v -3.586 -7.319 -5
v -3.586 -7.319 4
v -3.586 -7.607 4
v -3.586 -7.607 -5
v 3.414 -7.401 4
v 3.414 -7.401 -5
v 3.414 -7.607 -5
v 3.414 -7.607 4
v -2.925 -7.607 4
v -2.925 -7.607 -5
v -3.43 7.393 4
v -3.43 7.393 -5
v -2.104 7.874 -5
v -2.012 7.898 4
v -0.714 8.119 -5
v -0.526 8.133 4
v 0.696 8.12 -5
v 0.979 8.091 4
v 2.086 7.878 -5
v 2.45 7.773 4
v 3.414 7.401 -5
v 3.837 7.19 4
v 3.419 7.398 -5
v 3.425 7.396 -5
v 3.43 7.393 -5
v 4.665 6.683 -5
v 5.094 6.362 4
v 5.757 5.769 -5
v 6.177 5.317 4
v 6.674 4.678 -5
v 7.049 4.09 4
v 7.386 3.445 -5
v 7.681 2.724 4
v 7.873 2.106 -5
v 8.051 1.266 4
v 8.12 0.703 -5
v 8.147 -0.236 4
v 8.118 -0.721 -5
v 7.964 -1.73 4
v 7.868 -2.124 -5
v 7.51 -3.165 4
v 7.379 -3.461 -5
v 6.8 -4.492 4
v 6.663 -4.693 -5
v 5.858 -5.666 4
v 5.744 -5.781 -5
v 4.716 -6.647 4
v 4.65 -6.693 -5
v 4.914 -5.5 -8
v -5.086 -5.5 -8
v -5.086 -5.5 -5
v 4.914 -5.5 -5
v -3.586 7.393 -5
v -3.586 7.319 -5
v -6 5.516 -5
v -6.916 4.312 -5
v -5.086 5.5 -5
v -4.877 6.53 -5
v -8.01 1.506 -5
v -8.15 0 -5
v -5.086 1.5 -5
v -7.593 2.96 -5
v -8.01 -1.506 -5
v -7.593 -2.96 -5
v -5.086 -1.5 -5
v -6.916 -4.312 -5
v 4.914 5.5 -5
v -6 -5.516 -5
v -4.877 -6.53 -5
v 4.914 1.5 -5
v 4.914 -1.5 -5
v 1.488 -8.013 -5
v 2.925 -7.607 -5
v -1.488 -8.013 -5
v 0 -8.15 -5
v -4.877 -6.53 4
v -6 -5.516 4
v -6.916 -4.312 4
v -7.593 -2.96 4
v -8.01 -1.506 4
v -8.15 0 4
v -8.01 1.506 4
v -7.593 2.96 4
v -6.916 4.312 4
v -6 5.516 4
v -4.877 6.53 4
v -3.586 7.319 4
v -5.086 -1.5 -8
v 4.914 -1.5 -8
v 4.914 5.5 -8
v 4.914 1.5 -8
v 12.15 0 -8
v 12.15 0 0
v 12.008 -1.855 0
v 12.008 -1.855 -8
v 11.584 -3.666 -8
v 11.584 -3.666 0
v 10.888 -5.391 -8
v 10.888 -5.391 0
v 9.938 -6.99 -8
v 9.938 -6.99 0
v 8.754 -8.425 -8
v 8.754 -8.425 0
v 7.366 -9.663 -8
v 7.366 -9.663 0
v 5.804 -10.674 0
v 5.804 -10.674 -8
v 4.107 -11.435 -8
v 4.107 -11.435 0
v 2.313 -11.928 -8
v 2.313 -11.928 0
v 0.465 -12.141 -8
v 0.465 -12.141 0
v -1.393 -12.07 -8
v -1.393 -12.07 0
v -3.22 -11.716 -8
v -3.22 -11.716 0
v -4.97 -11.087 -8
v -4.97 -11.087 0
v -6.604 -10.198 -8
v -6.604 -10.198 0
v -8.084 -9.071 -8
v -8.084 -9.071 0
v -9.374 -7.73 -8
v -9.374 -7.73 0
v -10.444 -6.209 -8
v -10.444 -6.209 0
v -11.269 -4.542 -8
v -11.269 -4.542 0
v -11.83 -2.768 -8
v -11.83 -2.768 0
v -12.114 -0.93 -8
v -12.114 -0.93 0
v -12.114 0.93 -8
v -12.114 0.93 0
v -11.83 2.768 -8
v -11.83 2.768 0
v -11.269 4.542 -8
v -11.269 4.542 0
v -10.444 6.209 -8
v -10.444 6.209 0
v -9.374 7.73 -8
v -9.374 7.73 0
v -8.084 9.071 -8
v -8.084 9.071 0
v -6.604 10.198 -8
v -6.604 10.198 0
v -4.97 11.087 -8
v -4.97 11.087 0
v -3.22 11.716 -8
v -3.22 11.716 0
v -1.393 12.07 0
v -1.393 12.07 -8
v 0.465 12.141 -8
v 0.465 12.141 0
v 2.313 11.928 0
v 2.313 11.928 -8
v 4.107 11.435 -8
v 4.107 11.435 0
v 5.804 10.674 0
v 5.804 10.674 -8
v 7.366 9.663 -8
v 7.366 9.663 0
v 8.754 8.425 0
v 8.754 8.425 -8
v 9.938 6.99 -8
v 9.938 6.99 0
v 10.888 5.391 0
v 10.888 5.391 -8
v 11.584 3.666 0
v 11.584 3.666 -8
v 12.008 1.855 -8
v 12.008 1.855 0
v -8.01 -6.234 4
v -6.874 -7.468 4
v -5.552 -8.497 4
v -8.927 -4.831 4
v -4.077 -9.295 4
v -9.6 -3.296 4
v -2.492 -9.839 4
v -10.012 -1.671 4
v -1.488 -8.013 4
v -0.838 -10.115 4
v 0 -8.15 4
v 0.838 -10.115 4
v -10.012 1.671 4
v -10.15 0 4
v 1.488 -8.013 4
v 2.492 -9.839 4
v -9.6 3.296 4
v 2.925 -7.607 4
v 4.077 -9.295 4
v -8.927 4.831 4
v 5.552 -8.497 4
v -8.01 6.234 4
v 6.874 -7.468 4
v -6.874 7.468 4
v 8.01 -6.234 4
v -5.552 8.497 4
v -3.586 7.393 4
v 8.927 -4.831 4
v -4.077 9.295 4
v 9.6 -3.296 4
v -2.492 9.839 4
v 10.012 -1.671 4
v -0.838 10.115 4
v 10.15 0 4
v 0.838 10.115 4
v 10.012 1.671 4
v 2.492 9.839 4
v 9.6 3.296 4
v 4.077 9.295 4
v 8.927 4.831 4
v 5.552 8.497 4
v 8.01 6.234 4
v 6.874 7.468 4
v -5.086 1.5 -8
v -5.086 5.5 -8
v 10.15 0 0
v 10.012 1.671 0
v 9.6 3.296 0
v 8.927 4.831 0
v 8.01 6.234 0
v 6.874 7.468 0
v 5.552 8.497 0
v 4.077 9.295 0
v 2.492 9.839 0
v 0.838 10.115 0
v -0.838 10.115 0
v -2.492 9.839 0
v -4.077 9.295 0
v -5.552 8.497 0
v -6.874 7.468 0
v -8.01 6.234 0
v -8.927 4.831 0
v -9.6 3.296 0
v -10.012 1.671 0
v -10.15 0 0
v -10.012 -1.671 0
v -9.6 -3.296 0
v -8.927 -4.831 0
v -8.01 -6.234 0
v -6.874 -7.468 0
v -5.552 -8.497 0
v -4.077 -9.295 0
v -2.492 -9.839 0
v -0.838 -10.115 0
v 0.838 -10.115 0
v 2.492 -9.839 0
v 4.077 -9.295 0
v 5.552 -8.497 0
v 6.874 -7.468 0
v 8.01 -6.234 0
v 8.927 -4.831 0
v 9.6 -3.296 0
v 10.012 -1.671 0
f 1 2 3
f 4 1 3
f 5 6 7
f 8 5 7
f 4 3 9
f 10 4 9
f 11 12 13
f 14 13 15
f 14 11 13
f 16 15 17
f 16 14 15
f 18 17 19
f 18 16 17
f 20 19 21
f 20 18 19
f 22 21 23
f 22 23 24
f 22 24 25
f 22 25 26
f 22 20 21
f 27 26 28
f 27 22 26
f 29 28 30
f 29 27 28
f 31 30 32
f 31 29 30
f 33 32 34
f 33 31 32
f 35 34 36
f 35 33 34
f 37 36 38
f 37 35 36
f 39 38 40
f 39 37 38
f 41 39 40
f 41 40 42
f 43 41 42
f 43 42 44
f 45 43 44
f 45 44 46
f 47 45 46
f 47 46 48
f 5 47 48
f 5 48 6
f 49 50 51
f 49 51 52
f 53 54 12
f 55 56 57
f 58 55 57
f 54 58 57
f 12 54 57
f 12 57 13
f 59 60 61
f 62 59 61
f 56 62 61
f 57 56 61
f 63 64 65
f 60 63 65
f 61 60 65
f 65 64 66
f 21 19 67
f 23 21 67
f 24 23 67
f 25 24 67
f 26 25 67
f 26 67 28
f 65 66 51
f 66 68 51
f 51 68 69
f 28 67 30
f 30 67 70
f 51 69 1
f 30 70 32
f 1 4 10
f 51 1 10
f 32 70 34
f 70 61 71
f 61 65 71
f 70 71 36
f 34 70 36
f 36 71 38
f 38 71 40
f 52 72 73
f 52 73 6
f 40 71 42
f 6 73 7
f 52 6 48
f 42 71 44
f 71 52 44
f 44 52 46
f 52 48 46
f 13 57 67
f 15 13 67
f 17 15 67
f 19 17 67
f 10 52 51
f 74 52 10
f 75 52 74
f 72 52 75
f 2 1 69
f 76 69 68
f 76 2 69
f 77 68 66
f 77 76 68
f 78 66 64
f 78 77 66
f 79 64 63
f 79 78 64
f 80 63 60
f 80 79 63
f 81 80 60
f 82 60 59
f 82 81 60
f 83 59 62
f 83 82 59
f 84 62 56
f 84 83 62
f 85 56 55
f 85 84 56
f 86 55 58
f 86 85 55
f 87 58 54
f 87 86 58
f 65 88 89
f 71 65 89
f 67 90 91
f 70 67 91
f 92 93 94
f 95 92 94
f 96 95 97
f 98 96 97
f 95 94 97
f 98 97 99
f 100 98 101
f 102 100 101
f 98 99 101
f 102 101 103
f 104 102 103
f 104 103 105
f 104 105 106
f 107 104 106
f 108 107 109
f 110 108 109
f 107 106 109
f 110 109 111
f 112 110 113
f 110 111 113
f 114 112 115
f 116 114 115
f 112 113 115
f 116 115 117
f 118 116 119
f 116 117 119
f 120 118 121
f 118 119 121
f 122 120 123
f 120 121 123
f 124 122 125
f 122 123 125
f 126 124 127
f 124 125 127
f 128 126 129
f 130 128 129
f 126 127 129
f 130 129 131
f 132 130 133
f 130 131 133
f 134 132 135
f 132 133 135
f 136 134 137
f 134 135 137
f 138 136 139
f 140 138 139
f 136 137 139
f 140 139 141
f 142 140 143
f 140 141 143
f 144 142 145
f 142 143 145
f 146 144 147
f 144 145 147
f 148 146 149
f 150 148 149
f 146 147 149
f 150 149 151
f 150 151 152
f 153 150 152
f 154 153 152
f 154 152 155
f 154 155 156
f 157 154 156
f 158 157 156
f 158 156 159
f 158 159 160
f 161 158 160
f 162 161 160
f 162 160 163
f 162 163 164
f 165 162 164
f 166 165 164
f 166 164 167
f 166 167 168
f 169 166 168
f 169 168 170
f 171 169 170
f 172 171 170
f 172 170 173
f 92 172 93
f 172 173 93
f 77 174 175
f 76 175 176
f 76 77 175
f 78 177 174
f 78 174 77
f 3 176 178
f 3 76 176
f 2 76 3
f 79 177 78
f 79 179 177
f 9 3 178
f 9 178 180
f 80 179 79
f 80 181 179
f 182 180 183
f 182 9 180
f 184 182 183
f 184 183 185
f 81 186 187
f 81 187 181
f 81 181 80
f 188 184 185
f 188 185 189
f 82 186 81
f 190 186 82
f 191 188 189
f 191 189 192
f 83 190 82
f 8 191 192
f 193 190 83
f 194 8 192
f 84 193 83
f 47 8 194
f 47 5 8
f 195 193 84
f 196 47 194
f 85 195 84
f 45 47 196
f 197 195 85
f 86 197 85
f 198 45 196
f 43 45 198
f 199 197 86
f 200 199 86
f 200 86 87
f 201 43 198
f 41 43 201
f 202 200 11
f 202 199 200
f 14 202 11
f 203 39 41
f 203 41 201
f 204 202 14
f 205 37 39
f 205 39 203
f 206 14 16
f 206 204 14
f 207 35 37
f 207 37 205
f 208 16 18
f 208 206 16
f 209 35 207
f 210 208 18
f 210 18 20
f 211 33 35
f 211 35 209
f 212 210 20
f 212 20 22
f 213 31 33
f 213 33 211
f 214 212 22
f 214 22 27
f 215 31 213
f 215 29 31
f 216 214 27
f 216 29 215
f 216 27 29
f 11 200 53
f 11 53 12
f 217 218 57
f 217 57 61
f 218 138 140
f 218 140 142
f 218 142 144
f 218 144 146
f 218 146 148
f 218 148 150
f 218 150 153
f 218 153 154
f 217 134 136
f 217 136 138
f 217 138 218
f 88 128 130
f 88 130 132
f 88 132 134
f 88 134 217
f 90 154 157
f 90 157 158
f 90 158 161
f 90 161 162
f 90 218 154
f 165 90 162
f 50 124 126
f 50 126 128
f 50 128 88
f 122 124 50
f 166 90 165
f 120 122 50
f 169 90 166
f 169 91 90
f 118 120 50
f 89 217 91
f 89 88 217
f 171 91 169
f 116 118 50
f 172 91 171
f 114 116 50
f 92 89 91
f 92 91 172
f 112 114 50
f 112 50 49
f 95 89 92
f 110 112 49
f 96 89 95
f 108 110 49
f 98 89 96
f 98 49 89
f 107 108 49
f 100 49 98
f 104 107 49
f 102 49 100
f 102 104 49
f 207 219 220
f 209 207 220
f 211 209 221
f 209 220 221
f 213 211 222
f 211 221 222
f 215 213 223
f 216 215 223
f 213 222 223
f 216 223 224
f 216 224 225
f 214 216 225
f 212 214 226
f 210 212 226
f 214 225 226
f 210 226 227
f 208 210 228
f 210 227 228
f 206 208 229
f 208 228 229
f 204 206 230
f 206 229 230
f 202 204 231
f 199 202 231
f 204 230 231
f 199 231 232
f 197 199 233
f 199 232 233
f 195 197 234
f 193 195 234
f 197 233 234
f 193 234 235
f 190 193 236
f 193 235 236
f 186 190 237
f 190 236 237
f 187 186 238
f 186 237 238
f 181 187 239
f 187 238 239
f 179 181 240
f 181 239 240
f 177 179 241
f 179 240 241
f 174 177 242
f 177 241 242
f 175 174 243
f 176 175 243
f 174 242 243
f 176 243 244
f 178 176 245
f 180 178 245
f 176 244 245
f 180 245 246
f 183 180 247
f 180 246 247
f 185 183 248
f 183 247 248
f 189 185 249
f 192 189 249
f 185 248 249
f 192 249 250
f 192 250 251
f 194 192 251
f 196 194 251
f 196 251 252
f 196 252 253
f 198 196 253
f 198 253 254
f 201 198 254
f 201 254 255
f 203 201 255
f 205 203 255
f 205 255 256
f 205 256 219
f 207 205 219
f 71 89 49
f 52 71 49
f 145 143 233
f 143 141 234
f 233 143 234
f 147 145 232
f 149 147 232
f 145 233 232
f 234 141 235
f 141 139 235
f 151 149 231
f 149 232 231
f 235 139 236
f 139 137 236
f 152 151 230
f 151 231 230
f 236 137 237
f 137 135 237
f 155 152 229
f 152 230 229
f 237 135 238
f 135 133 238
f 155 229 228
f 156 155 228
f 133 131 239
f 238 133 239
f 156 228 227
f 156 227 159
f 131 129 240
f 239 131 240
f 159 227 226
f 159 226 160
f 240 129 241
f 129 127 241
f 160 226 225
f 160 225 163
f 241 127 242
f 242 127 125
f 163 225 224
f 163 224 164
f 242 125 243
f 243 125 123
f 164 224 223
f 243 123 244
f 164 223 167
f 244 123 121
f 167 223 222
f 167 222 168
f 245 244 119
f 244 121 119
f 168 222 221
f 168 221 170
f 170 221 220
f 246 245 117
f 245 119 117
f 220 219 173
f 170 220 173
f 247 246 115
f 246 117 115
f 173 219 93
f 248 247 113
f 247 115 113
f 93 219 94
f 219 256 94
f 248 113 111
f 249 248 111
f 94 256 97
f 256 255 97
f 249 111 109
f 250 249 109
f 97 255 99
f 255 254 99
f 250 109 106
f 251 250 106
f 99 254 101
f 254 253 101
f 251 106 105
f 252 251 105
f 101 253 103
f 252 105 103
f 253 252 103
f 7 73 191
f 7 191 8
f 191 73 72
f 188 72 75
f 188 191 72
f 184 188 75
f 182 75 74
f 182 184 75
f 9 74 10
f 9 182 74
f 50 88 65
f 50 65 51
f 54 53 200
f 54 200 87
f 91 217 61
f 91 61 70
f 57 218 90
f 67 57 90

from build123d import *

# Parameters (mm, degrees)
F0_R     = 10.15
F0_R_2   = 8.15
F1_DEPTH = 4
F2_R     = 12.15
F2_R_2   = 8.15
F3_DEPTH = 8
F4_W     = 7
F4_H     = 15
F5_DEPTH = 17.272
F6_W     = 9.9999997467
F6_H     = 4
F7_DEPTH = 3


with BuildPart() as f1:
    # F0 (on Top) → F1 (new body)
    with BuildSketch(Plane.XY):
        Circle(F0_R)
        Circle(F0_R_2, mode=Mode.SUBTRACT)
    extrude(amount=F1_DEPTH)

    # F2 (on face) → F3 (join)
    with BuildSketch(Plane(origin=(0, 0, 0), x_dir=(1, 0, 0), z_dir=(0, 0, -1))):
        Circle(F2_R)
        Circle(F2_R_2, mode=Mode.SUBTRACT)
    extrude(amount=F3_DEPTH)

    # F4 (on face) → F5 (cut)
    with BuildSketch(Plane(origin=(0, 0, -8), x_dir=(1, 0, 0), z_dir=(0, 0, -1))):
        with Locations((-0.0862163142, 0.1069762555)):
            Rectangle(F4_W, F4_H)
    extrude(amount=-F5_DEPTH, mode=Mode.SUBTRACT)

    # F6 (on face) → F7 (join)
    with BuildSketch(Plane(origin=(0, 0, -8), x_dir=(1, 0, 0), z_dir=(0, 0, -1))):
        with BuildLine():
            ThreePointArc((-3.5862161876, 7.3185760583), (-8.1500001267, 0), (-3.5862161876, -7.3185760583))
            Line((-3.5862161876, -7.3185760583), (-3.5862161876, -7.3930236179))
            Line((-3.5862161876, -7.3930236179), (-3.4301165755, -7.3930236179))
            ThreePointArc((-3.4301165755, -7.3930236179), (-0.0089980782, -8.1499949061), (3.4137835591, -7.4005796899))
            Line((3.4137835591, -7.4005796899), (3.4137835591, -7.3930236179))
            Line((3.4137835591, -7.3930236179), (3.4301165755, -7.3930236179))
            ThreePointArc((3.4301165755, -7.3930236179), (8.1499949061, 0.0089980782), (3.4137835591, 7.4005796899))
            Line((3.4137835591, 7.4005796899), (3.4137835591, 7.6069761288))
            Line((3.4137835591, 7.6069761288), (2.9251345458, 7.6069761288))
            ThreePointArc((2.9251345458, 7.6069761288), (0, 8.1499998733), (-2.9251345458, 7.6069761288))
            Line((-2.9251345458, 7.6069761288), (-3.5862161876, 7.6069761288))
            Line((-3.5862161876, 7.6069761288), (-3.5862161876, 7.3185760583))
        make_face()
        with Locations((-0.0862163142, -3.5)):
            Rectangle(F6_W, F6_H, mode=Mode.SUBTRACT)
        with Locations((-0.0862163142, 3.5)):
            Rectangle(F6_W, F6_H, mode=Mode.SUBTRACT)
        with BuildLine():
            Line((3.4137835591, -7.3930236179), (3.4137835591, -7.4005796899))
            ThreePointArc((3.4137835591, -7.4005796899), (3.4219521529, -7.396806162), (3.4301165755, -7.3930236179))
            Line((3.4301165755, -7.3930236179), (3.4137835591, -7.3930236179))
        make_face()
    extrude(amount=-F7_DEPTH)


solid = f1.part
